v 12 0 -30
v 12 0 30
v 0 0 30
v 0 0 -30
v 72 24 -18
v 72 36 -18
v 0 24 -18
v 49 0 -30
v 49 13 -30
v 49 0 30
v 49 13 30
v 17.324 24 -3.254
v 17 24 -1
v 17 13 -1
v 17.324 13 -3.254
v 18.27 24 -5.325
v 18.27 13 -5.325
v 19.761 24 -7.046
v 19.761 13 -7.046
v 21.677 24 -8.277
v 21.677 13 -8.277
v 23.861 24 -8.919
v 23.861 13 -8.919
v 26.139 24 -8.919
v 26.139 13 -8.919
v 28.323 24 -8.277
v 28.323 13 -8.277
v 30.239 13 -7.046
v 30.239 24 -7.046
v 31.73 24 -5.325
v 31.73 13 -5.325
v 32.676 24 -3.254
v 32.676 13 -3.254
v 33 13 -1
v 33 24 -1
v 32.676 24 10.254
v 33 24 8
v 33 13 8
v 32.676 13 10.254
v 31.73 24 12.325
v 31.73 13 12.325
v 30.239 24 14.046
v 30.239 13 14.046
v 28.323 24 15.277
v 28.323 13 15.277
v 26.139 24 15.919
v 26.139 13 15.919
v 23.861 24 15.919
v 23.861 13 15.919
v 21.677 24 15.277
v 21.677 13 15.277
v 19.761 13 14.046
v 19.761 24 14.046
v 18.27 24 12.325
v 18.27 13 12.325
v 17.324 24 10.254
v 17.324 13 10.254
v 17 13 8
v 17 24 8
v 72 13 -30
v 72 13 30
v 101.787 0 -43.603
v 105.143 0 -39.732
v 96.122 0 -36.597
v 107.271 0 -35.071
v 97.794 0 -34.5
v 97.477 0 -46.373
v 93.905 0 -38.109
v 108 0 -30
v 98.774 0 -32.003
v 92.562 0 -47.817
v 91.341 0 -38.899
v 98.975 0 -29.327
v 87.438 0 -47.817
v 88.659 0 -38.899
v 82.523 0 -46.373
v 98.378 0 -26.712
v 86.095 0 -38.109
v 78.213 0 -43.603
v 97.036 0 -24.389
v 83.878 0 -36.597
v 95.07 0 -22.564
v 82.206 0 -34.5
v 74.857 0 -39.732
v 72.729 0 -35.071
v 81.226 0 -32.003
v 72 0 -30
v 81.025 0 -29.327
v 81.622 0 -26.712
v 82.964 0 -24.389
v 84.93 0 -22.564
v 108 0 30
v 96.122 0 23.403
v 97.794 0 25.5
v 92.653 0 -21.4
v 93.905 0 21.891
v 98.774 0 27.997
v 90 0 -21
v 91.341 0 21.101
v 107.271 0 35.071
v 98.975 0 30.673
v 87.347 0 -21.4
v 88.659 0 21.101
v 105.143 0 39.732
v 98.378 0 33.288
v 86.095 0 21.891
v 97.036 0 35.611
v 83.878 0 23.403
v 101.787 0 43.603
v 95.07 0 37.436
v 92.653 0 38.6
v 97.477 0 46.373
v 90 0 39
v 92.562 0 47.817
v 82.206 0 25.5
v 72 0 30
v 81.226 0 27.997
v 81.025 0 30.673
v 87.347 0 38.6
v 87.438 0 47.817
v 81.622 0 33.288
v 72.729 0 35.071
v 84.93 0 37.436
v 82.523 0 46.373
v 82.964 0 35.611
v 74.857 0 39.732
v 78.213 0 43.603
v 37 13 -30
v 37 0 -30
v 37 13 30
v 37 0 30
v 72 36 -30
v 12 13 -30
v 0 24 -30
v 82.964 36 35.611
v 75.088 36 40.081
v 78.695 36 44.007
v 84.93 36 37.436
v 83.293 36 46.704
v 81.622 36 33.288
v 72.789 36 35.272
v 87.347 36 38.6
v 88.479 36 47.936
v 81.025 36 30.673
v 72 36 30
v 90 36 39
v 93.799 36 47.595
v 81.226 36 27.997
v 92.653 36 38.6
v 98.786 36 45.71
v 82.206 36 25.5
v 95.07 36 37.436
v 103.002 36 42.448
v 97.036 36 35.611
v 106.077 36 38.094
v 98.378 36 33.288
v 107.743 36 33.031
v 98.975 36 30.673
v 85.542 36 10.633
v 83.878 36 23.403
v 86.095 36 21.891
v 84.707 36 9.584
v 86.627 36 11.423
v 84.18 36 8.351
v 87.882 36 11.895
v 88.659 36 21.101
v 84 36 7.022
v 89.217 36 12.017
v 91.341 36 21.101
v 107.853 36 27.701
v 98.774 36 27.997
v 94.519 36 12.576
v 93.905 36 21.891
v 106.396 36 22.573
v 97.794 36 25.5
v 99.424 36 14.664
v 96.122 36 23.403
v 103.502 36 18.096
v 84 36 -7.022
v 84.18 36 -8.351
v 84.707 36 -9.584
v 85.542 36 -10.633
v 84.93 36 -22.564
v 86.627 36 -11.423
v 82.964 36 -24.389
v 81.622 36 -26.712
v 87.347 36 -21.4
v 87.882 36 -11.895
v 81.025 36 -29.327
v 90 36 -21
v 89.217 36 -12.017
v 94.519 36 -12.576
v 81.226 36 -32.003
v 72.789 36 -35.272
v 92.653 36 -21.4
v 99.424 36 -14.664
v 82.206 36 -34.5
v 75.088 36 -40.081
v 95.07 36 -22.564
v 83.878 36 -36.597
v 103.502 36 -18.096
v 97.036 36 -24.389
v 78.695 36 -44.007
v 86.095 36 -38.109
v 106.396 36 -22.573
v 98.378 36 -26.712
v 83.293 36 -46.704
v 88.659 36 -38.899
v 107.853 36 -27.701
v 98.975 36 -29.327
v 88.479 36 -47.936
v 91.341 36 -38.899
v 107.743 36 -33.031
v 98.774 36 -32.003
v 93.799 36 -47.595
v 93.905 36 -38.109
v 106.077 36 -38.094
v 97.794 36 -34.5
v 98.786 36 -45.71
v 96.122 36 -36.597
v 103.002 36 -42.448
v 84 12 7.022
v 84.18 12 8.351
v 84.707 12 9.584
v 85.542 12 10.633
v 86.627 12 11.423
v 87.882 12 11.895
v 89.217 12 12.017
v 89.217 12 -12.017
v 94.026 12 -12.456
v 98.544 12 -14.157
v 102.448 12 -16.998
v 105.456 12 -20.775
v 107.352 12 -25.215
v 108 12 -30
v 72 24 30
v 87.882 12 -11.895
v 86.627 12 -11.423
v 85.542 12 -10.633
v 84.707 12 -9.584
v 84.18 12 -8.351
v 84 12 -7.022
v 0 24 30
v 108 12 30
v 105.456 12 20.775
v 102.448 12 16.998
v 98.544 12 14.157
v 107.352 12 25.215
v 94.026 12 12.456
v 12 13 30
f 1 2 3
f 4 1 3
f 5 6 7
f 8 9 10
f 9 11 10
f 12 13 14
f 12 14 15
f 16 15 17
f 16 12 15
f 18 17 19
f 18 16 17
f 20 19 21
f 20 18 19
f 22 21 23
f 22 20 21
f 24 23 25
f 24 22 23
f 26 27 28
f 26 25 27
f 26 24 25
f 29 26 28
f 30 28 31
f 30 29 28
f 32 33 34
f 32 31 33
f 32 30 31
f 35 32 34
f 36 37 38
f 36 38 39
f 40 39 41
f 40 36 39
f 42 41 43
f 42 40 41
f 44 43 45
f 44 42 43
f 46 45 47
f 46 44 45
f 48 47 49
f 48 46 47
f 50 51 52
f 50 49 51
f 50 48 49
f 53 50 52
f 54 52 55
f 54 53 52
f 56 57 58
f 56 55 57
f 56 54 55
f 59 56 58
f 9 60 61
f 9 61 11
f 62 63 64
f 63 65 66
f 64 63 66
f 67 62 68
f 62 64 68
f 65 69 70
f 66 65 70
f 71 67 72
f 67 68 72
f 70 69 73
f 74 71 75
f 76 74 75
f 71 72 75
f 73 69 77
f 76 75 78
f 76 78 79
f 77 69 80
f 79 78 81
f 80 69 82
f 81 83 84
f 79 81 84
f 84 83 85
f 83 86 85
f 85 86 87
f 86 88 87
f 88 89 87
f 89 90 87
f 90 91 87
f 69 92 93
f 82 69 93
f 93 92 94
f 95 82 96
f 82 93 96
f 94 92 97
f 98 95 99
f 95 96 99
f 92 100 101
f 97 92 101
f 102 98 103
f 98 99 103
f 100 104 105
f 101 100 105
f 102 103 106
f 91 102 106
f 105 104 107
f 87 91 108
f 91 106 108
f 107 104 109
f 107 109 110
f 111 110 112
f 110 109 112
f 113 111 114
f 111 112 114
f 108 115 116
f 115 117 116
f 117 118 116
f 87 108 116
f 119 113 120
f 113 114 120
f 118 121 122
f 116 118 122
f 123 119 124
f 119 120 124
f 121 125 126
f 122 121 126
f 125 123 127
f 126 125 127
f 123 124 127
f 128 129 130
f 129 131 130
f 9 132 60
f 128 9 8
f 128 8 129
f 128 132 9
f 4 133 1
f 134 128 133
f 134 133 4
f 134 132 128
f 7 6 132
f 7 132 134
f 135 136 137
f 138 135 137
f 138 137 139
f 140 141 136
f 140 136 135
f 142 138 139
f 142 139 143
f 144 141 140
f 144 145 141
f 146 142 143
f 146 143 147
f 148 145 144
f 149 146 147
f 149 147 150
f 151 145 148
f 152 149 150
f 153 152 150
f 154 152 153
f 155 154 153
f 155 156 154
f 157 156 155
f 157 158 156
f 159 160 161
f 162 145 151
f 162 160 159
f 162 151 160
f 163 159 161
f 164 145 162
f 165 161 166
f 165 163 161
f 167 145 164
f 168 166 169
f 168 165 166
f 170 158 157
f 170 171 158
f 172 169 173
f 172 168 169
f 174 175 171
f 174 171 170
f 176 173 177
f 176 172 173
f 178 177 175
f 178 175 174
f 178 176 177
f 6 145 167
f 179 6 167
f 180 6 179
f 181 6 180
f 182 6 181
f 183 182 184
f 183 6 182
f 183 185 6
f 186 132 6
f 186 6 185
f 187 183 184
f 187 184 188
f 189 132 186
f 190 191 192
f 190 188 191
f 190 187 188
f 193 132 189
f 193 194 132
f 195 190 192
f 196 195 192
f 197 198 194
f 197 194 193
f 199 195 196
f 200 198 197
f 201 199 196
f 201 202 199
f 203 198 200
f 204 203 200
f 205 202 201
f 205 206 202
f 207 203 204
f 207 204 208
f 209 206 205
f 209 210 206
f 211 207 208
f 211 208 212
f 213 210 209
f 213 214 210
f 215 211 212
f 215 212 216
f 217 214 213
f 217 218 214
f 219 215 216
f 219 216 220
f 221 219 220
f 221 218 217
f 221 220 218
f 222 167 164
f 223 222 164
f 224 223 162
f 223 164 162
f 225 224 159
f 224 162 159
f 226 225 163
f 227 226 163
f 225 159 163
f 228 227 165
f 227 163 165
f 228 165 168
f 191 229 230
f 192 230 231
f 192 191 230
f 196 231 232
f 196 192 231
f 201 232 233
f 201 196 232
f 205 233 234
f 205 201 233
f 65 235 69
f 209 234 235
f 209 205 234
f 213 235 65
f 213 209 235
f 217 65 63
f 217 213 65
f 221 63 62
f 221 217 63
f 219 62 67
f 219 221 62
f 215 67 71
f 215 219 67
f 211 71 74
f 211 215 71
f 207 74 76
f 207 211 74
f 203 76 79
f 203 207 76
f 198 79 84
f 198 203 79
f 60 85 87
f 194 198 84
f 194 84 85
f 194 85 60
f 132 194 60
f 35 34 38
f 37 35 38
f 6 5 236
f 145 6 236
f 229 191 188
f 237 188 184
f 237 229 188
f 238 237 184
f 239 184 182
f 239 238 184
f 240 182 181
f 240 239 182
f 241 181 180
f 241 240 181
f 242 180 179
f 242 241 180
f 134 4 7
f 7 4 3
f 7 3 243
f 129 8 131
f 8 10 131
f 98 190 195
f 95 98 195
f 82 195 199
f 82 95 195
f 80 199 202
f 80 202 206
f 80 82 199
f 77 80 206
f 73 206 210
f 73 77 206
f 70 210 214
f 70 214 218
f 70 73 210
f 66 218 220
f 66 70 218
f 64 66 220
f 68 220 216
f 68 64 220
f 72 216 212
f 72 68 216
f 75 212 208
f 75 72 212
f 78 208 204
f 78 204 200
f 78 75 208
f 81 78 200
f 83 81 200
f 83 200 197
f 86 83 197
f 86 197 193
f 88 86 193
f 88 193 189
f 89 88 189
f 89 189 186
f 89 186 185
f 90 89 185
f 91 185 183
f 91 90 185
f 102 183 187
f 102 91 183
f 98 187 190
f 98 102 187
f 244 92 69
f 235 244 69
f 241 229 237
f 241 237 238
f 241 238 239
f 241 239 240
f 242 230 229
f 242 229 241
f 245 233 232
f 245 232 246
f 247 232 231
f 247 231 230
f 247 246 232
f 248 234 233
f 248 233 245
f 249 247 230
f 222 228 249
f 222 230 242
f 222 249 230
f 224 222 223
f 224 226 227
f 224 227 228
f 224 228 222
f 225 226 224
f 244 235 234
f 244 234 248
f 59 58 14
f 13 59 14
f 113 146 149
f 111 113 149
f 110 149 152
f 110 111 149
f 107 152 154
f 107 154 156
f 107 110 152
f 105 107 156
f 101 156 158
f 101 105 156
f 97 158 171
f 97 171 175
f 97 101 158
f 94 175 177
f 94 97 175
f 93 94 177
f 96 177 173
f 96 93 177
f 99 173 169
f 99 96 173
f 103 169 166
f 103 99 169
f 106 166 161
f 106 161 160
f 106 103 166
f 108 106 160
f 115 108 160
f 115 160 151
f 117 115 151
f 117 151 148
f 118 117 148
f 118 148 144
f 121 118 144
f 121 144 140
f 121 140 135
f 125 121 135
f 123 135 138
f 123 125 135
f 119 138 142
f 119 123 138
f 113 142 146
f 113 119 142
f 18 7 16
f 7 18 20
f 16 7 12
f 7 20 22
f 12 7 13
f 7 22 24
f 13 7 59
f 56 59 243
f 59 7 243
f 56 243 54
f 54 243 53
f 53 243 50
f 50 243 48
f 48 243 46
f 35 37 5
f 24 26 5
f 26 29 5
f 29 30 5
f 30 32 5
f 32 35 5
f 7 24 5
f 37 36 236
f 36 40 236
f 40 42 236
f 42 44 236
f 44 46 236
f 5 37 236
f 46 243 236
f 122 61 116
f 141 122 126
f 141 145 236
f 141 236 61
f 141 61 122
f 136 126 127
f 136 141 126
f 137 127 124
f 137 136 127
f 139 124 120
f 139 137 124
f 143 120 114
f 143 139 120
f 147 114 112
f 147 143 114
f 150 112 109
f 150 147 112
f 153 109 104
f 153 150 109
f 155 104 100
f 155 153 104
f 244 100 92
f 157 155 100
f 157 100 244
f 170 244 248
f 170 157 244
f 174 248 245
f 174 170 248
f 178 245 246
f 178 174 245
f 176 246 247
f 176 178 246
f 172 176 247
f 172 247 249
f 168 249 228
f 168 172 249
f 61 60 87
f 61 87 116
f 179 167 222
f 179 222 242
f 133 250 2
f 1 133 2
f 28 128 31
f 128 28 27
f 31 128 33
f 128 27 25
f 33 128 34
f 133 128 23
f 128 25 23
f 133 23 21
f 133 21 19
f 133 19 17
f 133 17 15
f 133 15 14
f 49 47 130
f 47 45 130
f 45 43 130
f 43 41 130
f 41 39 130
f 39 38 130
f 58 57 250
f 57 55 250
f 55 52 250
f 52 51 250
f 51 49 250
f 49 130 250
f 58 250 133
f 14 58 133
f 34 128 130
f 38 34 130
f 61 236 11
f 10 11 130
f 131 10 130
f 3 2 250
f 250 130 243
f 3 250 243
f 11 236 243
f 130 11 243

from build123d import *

# Parameters (mm, degrees)
BOSS_EXTRUDE1_DEPTH      = 30
SKETCH2_R                = 9
BOSS_EXTRUDE2_DEPTH      = 12
BOSS_EXTRUDE2_DEPTH_BACK = 24
FILLET1_R                = 5
BOSS_EXTRUDE3_DEPTH      = 12
RIB1_REACH               = 80
SKETCH4_WALL_W           = 230.993150364
SKETCH4_WALL_H           = 12
CUT_EXTRUDE1_DEPTH       = 25


with BuildPart() as part:
    # Sketch1 → Boss-Extrude1 (new body, symmetric)
    with BuildSketch(Plane.XY):
        Polygon((0, 0), (0, 24), (72, 24), (72, 13), (49, 13), (49, 0), (37, 0), (37, 13), (12, 13), (12, 0), align=None)
    extrude(amount=BOSS_EXTRUDE1_DEPTH, both=True)

    # Sketch2 → Boss-Extrude2 (add, two sides)
    with BuildSketch(Plane(origin=(0, 24, 0), x_dir=(1, 0, 0), z_dir=(0, 1, 0))) as boss_extrude2_sk:
        with BuildLine():
            Line((72, 30), (72, -30))
            ThreePointArc((72, -30), (104.696938457, -40.392304845), (84, -13.029437252))
            Line((84, -13.029437252), (84, 13.029437252))
            ThreePointArc((84, 13.029437252), (104.696938457, 40.392304845), (72, 30))
        make_face()
        with Locations(Location((90, 30, 0), (0, 0, 270))):  # turned: the seam where the file's is
            Circle(SKETCH2_R, mode=Mode.SUBTRACT)
        with Locations(Location((90, -30, 0), (0, 0, 270))):  # turned: the seam where the file's is
            Circle(SKETCH2_R, mode=Mode.SUBTRACT)
    extrude(amount=BOSS_EXTRUDE2_DEPTH)
    extrude(boss_extrude2_sk.sketch, amount=-BOSS_EXTRUDE2_DEPTH_BACK)

    # Fillet1
    fillet1_edges = [part.edges().sort_by_distance(p)[0] for p in [
        (84, 18, -13.029437252),
        (84, 18, 13.029437252),
    ]]
    fillet(fillet1_edges, radius=FILLET1_R)

    # Sketch3 → Boss-Extrude3 (add)
    with BuildSketch(Plane.XZ):
        with BuildLine():
            Line((108, 30), (108, -30))
            ThreePointArc((108, -30), (102.448153347, -16.998327867), (89.217391304, -12.01702128))
            ThreePointArc((89.217391304, -12.01702128), (85.542179626, -10.633325006), (84, -7.021749414))
            Line((84, -7.021749414), (84, 7.021749414))
            ThreePointArc((84, 7.021749414), (85.542179626, 10.633325006), (89.217391304, 12.01702128))
            ThreePointArc((89.217391304, 12.01702128), (102.448153347, 16.998327867), (108, 30))
        make_face()
    extrude(amount=-BOSS_EXTRUDE3_DEPTH)

    # Sketch4 wall → Rib1 (add, up to next)
    with BuildSketch(Plane(origin=(36, 30, -30), x_dir=(-0.986393924, -0.164398987, 0), z_dir=(-0.164398987, 0.986393924, 0)), mode=Mode.PRIVATE) as rib1_sk1:
        with Locations((0, 6)):
            Rectangle(SKETCH4_WALL_W, SKETCH4_WALL_H)
    rib1_tool1 = extrude(rib1_sk1.sketch, amount=-RIB1_REACH, mode=Mode.PRIVATE) - part.part
    add(rib1_tool1.solids().sort_by_distance((36, 30, -30))[0])

    # Sketch5 → Cut-Extrude1 (cut, through all)
    with BuildSketch(Plane(origin=(0, 24, 0), x_dir=(1, 0, 0), z_dir=(0, 1, 0))):
        with BuildLine():
            Line((33, 1), (33, -8))
            ThreePointArc((33, -8), (25, -16), (17, -8))
            Line((17, -8), (17, 1))
            ThreePointArc((17, 1), (25, 9), (33, 1))
        make_face()
    extrude(amount=-CUT_EXTRUDE1_DEPTH, mode=Mode.SUBTRACT)


solid = part.part
